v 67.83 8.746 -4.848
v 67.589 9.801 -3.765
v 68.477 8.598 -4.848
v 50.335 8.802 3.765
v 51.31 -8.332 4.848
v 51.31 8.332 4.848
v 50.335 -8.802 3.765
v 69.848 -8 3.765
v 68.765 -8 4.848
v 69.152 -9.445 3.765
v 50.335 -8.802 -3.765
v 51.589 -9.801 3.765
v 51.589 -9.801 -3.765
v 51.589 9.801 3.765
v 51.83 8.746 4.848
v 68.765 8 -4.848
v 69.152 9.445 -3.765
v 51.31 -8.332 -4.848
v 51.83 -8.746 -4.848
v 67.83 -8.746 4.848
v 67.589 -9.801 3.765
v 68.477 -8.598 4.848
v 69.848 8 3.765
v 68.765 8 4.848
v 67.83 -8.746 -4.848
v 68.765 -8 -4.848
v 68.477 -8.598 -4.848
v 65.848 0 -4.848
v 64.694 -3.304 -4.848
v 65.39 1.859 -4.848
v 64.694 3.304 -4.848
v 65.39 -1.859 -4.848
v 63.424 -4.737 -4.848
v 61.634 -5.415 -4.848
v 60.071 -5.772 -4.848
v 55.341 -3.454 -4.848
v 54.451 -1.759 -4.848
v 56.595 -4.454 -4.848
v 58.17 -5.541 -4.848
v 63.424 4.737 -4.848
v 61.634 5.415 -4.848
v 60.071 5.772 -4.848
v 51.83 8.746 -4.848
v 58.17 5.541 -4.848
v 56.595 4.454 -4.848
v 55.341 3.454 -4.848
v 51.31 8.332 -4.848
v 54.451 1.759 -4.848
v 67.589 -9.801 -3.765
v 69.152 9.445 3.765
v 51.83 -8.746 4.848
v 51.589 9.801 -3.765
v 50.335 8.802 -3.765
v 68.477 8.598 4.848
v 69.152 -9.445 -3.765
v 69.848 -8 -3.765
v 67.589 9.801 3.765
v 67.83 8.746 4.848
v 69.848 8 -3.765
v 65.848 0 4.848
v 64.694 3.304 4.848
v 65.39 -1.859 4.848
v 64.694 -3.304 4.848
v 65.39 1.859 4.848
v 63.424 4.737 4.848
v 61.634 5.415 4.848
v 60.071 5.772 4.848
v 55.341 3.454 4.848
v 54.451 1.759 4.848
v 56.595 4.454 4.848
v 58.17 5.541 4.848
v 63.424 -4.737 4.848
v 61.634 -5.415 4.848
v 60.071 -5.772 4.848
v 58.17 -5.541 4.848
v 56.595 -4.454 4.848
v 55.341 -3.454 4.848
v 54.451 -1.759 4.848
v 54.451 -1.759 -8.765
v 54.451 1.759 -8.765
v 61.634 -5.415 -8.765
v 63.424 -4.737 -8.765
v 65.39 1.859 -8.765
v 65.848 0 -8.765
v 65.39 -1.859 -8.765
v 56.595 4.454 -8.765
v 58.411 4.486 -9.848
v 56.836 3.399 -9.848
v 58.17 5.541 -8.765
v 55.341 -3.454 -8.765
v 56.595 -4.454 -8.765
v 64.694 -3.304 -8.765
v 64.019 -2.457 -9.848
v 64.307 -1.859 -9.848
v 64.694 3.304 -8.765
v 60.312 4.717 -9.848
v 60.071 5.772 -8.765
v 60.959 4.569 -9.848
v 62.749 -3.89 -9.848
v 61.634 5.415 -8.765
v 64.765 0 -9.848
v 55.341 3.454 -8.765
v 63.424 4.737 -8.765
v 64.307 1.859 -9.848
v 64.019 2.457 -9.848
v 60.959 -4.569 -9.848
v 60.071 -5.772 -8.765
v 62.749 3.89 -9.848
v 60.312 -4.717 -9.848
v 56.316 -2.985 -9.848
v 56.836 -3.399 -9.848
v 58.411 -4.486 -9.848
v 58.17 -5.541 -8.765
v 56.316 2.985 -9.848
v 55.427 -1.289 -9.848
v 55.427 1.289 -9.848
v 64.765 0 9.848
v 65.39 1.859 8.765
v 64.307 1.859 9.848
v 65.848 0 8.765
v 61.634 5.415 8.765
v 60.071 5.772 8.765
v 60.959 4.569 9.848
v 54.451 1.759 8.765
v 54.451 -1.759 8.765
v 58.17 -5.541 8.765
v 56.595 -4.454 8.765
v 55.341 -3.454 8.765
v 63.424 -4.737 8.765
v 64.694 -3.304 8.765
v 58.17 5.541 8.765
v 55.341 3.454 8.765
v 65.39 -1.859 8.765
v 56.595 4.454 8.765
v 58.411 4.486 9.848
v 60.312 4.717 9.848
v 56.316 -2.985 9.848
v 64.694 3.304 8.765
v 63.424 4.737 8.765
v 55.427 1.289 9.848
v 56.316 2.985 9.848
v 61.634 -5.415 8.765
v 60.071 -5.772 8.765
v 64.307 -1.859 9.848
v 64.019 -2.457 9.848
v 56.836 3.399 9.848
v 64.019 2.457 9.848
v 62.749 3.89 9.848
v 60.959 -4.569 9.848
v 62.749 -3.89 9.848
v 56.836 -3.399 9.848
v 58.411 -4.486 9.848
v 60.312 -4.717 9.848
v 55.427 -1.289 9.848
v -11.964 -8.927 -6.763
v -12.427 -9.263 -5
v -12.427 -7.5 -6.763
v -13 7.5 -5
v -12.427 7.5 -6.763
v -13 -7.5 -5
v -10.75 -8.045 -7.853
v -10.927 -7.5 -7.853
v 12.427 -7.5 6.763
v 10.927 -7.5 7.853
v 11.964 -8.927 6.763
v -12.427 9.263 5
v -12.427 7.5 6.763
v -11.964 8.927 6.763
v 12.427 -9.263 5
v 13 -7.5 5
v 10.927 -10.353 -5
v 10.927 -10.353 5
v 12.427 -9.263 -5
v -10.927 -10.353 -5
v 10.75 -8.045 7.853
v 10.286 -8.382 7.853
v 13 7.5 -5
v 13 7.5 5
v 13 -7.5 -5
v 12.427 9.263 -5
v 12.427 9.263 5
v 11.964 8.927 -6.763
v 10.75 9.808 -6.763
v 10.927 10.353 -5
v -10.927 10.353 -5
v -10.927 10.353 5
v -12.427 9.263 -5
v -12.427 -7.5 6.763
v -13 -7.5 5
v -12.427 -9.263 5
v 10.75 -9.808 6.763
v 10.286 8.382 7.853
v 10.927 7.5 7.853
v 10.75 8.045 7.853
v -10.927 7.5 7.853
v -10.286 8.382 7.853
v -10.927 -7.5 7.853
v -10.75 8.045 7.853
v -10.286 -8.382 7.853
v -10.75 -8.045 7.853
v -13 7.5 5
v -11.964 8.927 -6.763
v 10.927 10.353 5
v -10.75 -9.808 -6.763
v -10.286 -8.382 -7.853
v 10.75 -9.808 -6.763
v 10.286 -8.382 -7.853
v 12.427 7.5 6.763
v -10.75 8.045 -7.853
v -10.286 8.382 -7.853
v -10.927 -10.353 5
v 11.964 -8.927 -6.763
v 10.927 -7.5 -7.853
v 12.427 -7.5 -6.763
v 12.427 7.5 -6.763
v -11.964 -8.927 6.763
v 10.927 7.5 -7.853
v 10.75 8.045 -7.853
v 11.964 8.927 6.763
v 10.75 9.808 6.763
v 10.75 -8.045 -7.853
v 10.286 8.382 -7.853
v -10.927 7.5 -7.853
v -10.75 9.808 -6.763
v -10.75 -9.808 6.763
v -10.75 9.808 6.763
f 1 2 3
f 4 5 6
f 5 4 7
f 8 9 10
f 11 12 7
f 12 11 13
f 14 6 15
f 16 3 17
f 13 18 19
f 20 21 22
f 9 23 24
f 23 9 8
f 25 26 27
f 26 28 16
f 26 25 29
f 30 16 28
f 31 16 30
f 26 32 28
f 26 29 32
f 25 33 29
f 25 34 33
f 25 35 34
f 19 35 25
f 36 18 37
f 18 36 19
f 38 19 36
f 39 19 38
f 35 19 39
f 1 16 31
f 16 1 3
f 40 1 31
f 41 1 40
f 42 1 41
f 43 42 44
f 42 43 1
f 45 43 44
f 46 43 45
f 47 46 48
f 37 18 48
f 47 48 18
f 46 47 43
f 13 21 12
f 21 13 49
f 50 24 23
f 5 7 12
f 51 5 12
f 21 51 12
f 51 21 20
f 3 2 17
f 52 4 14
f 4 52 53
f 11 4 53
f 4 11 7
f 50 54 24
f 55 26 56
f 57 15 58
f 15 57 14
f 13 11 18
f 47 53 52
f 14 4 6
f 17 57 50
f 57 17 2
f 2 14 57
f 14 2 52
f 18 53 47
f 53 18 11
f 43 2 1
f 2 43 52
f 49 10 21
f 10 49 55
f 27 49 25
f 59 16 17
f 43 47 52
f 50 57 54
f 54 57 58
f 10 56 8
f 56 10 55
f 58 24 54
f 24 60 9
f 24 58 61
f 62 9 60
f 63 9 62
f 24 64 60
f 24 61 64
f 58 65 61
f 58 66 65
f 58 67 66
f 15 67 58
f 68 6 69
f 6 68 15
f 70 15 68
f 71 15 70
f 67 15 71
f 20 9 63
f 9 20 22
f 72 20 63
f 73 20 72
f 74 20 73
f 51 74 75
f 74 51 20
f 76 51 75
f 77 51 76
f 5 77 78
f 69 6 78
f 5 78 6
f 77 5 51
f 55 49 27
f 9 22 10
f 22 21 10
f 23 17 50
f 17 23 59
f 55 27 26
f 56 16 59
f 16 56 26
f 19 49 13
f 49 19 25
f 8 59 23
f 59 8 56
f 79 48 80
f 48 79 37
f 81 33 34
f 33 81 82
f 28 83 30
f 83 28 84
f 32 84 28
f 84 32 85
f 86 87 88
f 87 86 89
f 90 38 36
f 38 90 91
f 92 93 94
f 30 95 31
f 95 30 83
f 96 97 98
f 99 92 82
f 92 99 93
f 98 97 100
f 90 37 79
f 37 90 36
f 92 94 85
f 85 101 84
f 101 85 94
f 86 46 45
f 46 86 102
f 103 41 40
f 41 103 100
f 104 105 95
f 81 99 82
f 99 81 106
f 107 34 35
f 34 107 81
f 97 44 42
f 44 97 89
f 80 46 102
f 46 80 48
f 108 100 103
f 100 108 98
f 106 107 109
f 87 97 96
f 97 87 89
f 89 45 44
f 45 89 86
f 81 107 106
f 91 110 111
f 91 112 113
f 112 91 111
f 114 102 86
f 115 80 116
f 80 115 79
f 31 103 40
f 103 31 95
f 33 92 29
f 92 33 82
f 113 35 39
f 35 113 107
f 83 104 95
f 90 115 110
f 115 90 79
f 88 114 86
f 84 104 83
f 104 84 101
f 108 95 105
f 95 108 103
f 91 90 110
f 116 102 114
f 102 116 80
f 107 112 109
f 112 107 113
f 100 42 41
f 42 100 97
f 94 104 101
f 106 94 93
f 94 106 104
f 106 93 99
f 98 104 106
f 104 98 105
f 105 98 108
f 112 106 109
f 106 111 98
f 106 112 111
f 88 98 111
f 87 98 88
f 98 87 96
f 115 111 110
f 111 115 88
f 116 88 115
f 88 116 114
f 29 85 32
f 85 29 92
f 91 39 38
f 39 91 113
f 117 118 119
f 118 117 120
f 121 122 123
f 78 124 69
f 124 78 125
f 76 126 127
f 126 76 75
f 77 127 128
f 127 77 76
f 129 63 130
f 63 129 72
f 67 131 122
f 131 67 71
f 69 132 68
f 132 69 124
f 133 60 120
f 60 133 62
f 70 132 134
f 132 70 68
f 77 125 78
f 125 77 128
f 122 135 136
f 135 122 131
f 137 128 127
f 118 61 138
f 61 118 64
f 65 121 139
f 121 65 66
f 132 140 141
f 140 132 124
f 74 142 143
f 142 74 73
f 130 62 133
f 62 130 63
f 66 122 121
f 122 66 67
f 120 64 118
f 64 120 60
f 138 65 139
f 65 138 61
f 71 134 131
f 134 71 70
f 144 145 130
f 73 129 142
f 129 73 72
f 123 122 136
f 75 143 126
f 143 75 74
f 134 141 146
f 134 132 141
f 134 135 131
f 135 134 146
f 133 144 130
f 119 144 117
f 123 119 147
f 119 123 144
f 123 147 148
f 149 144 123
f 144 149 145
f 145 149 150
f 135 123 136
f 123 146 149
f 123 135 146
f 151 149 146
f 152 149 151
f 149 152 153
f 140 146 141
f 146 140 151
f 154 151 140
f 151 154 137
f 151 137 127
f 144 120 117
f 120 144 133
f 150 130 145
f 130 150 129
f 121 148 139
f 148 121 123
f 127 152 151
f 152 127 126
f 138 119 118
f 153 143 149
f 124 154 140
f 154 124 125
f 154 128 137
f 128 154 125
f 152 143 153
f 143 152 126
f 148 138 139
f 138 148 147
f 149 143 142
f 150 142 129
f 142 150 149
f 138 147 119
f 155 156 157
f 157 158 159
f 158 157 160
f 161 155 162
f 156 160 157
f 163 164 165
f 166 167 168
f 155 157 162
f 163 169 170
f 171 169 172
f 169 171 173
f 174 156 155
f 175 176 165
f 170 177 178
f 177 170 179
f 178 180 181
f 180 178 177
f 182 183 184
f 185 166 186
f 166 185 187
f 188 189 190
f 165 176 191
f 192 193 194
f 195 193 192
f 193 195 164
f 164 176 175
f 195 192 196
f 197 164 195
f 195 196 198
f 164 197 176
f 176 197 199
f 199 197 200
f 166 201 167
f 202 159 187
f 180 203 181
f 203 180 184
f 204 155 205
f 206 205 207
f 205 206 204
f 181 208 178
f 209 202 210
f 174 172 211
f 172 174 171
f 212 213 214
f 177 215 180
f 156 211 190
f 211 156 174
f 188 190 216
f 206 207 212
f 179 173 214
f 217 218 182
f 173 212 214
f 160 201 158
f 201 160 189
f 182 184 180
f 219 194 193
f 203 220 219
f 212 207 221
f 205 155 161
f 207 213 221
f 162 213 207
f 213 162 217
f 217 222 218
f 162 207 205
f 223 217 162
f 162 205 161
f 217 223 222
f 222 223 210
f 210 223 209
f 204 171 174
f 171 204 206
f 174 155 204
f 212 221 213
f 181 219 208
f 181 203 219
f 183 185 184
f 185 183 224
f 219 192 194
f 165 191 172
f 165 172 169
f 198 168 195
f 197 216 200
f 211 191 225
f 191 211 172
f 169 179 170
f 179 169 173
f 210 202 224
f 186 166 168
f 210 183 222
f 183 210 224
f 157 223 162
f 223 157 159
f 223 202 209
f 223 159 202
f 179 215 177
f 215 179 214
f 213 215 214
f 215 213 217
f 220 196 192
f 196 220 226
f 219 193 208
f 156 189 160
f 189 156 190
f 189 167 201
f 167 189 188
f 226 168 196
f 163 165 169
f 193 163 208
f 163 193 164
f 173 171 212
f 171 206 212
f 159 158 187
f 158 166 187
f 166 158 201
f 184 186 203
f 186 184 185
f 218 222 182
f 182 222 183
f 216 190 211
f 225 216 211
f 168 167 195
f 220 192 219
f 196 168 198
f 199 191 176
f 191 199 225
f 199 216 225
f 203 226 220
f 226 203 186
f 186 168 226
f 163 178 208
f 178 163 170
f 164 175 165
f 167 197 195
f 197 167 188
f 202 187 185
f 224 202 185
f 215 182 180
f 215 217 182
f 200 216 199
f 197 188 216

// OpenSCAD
// Rung 1: analytic. Both of these become offset(..., kind=ARC).
minkowski() { cube([20, 15, 10], center = true); sphere(r = 3); }
translate([60, 0, 0]) minkowski() {
    union() { cube([16, 16, 6], center = true); cylinder(h = 16, r = 4, center = true); }
    sphere(r = 2);
}
